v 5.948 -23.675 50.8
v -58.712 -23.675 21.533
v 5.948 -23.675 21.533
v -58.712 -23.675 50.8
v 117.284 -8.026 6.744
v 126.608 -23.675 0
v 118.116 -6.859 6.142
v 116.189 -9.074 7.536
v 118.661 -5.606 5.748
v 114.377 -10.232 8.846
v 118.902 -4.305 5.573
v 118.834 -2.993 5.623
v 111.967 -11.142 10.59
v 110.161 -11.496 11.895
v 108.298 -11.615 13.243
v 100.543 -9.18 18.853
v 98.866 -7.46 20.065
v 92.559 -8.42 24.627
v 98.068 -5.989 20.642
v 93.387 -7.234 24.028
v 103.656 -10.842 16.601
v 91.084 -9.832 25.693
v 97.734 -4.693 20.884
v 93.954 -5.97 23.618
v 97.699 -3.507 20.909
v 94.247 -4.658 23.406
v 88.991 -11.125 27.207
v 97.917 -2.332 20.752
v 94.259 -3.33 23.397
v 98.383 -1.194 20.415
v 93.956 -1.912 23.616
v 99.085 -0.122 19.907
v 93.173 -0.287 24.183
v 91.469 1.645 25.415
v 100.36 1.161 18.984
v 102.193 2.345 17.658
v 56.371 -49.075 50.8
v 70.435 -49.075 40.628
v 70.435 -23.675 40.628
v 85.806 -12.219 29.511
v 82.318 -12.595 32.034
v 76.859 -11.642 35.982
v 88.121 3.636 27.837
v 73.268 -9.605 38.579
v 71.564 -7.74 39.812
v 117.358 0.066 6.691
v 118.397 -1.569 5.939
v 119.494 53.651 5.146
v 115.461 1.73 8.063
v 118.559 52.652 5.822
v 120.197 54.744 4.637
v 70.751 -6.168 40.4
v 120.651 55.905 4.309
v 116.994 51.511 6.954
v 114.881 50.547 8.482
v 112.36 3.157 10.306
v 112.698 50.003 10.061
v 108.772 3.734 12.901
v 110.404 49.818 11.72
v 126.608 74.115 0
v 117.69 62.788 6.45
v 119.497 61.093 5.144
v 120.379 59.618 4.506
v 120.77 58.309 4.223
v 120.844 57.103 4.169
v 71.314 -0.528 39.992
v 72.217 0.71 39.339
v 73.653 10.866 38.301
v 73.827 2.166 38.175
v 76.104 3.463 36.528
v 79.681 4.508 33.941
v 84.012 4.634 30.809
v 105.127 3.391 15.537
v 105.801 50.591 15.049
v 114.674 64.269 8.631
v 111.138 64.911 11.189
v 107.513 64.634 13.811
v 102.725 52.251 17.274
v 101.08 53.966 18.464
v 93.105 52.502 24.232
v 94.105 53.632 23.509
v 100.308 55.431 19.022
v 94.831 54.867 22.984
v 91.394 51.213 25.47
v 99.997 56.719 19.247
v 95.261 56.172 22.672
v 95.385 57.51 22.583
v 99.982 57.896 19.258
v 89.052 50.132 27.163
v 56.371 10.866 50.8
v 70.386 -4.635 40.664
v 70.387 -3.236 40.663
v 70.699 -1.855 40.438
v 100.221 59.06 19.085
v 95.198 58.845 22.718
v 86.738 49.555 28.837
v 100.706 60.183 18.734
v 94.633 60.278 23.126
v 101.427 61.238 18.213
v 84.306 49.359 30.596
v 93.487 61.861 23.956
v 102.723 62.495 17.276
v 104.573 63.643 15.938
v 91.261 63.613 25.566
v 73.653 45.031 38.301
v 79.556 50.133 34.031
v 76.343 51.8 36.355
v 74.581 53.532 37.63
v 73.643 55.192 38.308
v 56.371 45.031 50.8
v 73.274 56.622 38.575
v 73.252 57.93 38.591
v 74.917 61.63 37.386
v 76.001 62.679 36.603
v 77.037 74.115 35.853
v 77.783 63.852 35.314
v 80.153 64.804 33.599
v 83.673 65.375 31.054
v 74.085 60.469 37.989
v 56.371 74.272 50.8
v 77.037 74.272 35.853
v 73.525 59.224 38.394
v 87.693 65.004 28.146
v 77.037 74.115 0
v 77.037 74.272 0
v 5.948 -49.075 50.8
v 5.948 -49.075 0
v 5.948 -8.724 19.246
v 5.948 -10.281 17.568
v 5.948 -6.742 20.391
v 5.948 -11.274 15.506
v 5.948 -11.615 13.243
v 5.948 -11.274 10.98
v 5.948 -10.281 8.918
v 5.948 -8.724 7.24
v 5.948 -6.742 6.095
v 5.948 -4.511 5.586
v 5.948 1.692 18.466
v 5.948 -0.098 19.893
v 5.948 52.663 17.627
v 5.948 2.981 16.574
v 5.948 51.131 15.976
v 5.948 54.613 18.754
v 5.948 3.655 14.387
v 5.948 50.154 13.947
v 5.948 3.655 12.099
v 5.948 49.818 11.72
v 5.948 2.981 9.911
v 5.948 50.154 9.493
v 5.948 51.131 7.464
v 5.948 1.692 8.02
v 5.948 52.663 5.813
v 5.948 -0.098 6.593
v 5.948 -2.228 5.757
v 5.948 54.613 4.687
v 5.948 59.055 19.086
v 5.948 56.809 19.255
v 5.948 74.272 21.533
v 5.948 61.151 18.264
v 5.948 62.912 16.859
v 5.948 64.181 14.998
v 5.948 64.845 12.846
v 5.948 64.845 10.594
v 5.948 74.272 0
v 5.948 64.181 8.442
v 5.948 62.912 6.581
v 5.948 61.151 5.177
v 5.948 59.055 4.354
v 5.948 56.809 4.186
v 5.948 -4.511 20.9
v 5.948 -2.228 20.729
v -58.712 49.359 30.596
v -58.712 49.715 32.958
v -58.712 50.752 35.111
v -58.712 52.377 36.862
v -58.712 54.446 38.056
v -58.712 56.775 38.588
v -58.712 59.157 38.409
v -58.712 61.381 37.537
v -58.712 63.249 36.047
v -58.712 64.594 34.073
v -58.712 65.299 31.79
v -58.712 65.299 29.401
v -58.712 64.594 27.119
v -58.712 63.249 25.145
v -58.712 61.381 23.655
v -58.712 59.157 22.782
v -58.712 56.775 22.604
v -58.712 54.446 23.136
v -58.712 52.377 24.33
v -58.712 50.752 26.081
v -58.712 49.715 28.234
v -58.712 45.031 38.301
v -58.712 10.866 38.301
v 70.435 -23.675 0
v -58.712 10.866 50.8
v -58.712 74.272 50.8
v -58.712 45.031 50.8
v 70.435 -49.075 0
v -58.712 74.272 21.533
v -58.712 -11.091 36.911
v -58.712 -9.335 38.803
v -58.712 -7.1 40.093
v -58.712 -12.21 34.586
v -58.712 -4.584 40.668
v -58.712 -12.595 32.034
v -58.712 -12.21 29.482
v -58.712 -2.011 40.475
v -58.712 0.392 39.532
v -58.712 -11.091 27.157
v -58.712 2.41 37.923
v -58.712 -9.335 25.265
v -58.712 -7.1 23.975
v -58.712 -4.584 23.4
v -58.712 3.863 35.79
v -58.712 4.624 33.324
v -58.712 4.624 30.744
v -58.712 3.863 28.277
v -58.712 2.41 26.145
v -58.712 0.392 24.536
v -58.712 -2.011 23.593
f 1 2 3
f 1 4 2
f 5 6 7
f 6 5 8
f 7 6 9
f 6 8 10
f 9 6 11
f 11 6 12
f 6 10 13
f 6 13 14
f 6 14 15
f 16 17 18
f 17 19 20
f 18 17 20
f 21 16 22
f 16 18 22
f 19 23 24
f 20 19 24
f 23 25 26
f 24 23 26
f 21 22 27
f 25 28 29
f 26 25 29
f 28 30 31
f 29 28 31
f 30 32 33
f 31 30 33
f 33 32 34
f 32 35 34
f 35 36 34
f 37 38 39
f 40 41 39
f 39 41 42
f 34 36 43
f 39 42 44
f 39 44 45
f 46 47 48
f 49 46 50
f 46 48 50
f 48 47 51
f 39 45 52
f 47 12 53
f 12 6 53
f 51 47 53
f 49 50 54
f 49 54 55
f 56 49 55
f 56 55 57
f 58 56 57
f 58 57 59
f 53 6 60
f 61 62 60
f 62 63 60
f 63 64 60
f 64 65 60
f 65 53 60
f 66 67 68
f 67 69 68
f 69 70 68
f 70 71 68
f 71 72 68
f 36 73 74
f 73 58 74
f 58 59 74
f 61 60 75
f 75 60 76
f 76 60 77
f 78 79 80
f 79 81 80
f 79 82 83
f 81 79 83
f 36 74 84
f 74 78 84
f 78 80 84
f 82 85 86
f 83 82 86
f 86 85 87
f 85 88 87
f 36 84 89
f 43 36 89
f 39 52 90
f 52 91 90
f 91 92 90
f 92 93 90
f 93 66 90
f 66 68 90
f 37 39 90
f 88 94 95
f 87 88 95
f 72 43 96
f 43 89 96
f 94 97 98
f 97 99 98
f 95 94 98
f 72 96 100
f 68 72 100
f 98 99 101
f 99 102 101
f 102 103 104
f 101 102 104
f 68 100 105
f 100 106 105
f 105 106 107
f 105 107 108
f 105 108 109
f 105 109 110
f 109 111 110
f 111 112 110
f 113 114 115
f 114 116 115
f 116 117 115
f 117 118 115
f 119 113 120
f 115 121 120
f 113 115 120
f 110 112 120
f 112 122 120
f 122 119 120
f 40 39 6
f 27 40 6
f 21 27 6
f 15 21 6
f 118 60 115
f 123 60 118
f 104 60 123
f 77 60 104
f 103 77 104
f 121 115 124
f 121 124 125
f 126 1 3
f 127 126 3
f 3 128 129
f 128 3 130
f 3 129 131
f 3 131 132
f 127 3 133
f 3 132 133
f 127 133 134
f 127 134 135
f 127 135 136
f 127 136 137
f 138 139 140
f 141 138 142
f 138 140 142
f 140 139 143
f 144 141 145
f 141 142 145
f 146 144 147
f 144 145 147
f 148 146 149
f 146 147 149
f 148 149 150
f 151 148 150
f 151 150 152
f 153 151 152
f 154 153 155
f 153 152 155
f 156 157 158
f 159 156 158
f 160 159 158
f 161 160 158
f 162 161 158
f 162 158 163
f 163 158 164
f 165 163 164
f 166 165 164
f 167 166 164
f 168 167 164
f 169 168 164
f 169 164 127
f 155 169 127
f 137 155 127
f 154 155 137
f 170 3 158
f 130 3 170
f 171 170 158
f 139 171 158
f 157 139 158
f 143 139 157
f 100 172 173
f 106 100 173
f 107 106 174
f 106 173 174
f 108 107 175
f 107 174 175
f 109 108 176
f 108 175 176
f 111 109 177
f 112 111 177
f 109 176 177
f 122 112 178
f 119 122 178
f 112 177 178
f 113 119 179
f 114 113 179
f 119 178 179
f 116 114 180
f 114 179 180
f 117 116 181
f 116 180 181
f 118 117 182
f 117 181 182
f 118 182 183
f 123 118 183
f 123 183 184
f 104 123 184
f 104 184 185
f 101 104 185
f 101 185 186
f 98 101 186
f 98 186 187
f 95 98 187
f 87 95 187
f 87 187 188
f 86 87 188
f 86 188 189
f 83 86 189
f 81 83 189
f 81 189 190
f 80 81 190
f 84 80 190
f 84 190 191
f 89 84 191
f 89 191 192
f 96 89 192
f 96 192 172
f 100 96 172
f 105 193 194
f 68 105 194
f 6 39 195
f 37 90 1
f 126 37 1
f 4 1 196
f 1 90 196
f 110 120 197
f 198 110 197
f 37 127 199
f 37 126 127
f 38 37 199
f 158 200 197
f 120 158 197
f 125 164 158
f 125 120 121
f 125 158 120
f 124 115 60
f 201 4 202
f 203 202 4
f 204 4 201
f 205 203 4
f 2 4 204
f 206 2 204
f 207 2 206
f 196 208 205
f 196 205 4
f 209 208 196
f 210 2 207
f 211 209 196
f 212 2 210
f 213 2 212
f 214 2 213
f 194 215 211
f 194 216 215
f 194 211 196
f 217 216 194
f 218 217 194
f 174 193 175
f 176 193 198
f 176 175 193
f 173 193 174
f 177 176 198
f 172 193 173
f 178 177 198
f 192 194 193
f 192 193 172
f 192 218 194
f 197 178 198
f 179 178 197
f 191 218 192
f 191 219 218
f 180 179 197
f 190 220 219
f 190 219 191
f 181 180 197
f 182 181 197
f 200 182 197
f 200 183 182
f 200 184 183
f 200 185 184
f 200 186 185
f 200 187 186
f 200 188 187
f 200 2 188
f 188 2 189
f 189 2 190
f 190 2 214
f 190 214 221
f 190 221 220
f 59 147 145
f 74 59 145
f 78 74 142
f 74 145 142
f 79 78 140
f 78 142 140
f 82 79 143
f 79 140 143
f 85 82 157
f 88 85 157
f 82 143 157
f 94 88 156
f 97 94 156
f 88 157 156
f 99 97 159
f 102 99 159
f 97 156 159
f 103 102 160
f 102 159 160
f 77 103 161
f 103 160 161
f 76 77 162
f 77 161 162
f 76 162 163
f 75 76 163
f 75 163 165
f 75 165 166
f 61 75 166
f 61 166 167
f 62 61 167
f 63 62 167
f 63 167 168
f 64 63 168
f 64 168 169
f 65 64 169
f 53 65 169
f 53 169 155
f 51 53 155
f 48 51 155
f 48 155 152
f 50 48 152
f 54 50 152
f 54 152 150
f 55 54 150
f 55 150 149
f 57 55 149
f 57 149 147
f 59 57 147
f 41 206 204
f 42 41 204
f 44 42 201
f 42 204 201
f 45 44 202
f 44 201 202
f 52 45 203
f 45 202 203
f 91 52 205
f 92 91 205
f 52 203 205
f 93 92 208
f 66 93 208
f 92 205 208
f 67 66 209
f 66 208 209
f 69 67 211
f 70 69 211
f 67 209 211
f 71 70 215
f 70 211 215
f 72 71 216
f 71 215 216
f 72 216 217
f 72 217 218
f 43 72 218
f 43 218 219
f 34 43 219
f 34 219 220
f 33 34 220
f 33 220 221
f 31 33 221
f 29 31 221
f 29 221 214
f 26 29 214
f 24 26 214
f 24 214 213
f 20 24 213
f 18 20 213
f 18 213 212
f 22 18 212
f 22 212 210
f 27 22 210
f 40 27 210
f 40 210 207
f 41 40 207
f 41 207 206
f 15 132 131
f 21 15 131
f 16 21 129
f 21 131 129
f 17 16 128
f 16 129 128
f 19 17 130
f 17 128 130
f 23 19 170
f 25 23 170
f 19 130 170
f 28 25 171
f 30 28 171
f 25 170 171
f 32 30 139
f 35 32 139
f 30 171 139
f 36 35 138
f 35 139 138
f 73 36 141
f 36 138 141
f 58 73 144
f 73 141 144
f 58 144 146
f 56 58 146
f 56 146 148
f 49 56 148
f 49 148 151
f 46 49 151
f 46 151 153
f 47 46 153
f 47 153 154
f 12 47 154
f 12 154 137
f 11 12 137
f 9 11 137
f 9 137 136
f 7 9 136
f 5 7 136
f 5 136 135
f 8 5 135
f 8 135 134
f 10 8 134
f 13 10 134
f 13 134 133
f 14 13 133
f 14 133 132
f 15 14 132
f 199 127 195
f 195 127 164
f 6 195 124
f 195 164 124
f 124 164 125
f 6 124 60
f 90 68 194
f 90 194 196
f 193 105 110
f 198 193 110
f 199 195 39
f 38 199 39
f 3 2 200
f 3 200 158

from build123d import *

# Parameters (mm, degrees)
F0_W      = 184.4983883202
F0_H      = 97.9466736317
F1_DEPTH  = 50.8
F2_W      = 48.7498342991
F2_H      = 32.1726370603
F3_DEPTH  = 51.816
F5_DEPTH  = 152.4
F6_DEPTH  = 97.79
F8_DEPTH  = 200.914
F9_W      = 64.6597607993
F9_H      = 21.533165127
F10_DEPTH = 2540
F12_DEPTH = 25.4
F13_W     = 34.1657865793
F13_H     = 12.4993889213
F14_DEPTH = 177.8
F15_R     = 8.0143887739
F16_DEPTH = 381
F15_R_2   = 8.6578968481
F17_DEPTH = 381
F15_R_3   = 7.6783249055
F18_DEPTH = 381
F15_R_4   = 7.5555874341
F19_DEPTH = 381


with BuildPart() as f1:
    # F0 (on Top) → F1 (new body)
    with BuildSketch(Plane.XY):
        with Locations((33.5375722498, 25.2984389663)):
            Rectangle(F0_W, F0_H)
    extrude(amount=F1_DEPTH)

    # F2 (on face) → F3 (cut)
    with BuildSketch(Plane.XY.offset(50.8)):
        with Locations((101.4118492603, -7.5885793194)):
            Rectangle(F2_W, F2_H)
    extrude(amount=-F3_DEPTH, mode=Mode.SUBTRACT)

    # F5 (cut): a face of the model
    f5_faces = [f1.faces().sort_by_distance(p)[0] for p in [
        (101.4118492603, 8.4977392107, 25.4),
    ]]
    extrude(f5_faces, amount=-F5_DEPTH, mode=Mode.SUBTRACT)

    # F4 (on face) → F6 (join)
    with BuildSketch(Plane.XZ.offset(23.6748978496)):
        Polygon((126.6083866358, 0), (77.0369321108, 35.8533561641), (77.0369321108, 0), align=None)
    extrude(amount=-F6_DEPTH)

    # F7 (on face) → F8 (cut)
    with BuildSketch(Plane.XZ.offset(23.6748978496)):
        Polygon((56.3714504242, 50.8), (77.0369321108, 35.8533561641), (77.0369321108, 50.8), align=None)
    extrude(amount=-F8_DEPTH, mode=Mode.SUBTRACT)

    # F9 (on face) → F10 (cut)
    with BuildSketch(Plane.XZ.offset(23.6748978496)):
        with Locations((-26.3817415107, 10.7665825635)):
            Rectangle(F9_W, F9_H)
    extrude(amount=-F10_DEPTH, mode=Mode.SUBTRACT)

    # F11 (on face) → F12 (join)
    with BuildSketch(Plane.XZ.offset(23.6748978496)):
        Polygon((5.9481388889, 21.533165127), (5.9481388889, 0), (70.435055404, 0), (70.435055404, 40.6282702591), (56.3714504242, 50.8), (5.9481388889, 50.8), align=None)
    extrude(amount=F12_DEPTH)

    # F13 (on face) → F14 (cut)
    with BuildSketch(Plane(origin=(-58.7116219103, 0, 0), x_dir=(0, -1, 0), z_dir=(-1, 0, 0))):
        with Locations((-27.9484977946, 44.5503055394)):
            Rectangle(F13_W, F13_H)
    extrude(amount=-F14_DEPTH, mode=Mode.SUBTRACT)

    # F15 (on face) → F16 (cut)
    with BuildSketch(Plane(origin=(-58.7116219103, 0, 0), x_dir=(0, -1, 0), z_dir=(-1, 0, 0))):
        with Locations((-57.373650372, 30.5959098041)):
            Circle(F15_R)
    extrude(amount=-F16_DEPTH, mode=Mode.SUBTRACT)

    # F15 (on face) → F17 (cut)
    with BuildSketch(Plane(origin=(-58.7116219103, 0, 0), x_dir=(0, -1, 0), z_dir=(-1, 0, 0))):
        with Locations((3.9370707236, 32.0339165628)):
            Circle(F15_R_2)
    extrude(amount=-F17_DEPTH, mode=Mode.SUBTRACT)

    # F15 (on face) → F18 (cut)
    with BuildSketch(Plane(origin=(-58.7116219103, 0, 0), x_dir=(0, -1, 0), z_dir=(-1, 0, 0))):
        with Locations((3.9370707236, 13.242979534)):
            Circle(F15_R_3)
    extrude(amount=-F18_DEPTH, mode=Mode.SUBTRACT)

    # F15 (on face) → F19 (cut)
    with BuildSketch(Plane(origin=(-58.7116219103, 0, 0), x_dir=(0, -1, 0), z_dir=(-1, 0, 0))):
        with Locations((-57.373650372, 11.7202522233)):
            Circle(F15_R_4)
    extrude(amount=-F19_DEPTH, mode=Mode.SUBTRACT)


solid = f1.part
